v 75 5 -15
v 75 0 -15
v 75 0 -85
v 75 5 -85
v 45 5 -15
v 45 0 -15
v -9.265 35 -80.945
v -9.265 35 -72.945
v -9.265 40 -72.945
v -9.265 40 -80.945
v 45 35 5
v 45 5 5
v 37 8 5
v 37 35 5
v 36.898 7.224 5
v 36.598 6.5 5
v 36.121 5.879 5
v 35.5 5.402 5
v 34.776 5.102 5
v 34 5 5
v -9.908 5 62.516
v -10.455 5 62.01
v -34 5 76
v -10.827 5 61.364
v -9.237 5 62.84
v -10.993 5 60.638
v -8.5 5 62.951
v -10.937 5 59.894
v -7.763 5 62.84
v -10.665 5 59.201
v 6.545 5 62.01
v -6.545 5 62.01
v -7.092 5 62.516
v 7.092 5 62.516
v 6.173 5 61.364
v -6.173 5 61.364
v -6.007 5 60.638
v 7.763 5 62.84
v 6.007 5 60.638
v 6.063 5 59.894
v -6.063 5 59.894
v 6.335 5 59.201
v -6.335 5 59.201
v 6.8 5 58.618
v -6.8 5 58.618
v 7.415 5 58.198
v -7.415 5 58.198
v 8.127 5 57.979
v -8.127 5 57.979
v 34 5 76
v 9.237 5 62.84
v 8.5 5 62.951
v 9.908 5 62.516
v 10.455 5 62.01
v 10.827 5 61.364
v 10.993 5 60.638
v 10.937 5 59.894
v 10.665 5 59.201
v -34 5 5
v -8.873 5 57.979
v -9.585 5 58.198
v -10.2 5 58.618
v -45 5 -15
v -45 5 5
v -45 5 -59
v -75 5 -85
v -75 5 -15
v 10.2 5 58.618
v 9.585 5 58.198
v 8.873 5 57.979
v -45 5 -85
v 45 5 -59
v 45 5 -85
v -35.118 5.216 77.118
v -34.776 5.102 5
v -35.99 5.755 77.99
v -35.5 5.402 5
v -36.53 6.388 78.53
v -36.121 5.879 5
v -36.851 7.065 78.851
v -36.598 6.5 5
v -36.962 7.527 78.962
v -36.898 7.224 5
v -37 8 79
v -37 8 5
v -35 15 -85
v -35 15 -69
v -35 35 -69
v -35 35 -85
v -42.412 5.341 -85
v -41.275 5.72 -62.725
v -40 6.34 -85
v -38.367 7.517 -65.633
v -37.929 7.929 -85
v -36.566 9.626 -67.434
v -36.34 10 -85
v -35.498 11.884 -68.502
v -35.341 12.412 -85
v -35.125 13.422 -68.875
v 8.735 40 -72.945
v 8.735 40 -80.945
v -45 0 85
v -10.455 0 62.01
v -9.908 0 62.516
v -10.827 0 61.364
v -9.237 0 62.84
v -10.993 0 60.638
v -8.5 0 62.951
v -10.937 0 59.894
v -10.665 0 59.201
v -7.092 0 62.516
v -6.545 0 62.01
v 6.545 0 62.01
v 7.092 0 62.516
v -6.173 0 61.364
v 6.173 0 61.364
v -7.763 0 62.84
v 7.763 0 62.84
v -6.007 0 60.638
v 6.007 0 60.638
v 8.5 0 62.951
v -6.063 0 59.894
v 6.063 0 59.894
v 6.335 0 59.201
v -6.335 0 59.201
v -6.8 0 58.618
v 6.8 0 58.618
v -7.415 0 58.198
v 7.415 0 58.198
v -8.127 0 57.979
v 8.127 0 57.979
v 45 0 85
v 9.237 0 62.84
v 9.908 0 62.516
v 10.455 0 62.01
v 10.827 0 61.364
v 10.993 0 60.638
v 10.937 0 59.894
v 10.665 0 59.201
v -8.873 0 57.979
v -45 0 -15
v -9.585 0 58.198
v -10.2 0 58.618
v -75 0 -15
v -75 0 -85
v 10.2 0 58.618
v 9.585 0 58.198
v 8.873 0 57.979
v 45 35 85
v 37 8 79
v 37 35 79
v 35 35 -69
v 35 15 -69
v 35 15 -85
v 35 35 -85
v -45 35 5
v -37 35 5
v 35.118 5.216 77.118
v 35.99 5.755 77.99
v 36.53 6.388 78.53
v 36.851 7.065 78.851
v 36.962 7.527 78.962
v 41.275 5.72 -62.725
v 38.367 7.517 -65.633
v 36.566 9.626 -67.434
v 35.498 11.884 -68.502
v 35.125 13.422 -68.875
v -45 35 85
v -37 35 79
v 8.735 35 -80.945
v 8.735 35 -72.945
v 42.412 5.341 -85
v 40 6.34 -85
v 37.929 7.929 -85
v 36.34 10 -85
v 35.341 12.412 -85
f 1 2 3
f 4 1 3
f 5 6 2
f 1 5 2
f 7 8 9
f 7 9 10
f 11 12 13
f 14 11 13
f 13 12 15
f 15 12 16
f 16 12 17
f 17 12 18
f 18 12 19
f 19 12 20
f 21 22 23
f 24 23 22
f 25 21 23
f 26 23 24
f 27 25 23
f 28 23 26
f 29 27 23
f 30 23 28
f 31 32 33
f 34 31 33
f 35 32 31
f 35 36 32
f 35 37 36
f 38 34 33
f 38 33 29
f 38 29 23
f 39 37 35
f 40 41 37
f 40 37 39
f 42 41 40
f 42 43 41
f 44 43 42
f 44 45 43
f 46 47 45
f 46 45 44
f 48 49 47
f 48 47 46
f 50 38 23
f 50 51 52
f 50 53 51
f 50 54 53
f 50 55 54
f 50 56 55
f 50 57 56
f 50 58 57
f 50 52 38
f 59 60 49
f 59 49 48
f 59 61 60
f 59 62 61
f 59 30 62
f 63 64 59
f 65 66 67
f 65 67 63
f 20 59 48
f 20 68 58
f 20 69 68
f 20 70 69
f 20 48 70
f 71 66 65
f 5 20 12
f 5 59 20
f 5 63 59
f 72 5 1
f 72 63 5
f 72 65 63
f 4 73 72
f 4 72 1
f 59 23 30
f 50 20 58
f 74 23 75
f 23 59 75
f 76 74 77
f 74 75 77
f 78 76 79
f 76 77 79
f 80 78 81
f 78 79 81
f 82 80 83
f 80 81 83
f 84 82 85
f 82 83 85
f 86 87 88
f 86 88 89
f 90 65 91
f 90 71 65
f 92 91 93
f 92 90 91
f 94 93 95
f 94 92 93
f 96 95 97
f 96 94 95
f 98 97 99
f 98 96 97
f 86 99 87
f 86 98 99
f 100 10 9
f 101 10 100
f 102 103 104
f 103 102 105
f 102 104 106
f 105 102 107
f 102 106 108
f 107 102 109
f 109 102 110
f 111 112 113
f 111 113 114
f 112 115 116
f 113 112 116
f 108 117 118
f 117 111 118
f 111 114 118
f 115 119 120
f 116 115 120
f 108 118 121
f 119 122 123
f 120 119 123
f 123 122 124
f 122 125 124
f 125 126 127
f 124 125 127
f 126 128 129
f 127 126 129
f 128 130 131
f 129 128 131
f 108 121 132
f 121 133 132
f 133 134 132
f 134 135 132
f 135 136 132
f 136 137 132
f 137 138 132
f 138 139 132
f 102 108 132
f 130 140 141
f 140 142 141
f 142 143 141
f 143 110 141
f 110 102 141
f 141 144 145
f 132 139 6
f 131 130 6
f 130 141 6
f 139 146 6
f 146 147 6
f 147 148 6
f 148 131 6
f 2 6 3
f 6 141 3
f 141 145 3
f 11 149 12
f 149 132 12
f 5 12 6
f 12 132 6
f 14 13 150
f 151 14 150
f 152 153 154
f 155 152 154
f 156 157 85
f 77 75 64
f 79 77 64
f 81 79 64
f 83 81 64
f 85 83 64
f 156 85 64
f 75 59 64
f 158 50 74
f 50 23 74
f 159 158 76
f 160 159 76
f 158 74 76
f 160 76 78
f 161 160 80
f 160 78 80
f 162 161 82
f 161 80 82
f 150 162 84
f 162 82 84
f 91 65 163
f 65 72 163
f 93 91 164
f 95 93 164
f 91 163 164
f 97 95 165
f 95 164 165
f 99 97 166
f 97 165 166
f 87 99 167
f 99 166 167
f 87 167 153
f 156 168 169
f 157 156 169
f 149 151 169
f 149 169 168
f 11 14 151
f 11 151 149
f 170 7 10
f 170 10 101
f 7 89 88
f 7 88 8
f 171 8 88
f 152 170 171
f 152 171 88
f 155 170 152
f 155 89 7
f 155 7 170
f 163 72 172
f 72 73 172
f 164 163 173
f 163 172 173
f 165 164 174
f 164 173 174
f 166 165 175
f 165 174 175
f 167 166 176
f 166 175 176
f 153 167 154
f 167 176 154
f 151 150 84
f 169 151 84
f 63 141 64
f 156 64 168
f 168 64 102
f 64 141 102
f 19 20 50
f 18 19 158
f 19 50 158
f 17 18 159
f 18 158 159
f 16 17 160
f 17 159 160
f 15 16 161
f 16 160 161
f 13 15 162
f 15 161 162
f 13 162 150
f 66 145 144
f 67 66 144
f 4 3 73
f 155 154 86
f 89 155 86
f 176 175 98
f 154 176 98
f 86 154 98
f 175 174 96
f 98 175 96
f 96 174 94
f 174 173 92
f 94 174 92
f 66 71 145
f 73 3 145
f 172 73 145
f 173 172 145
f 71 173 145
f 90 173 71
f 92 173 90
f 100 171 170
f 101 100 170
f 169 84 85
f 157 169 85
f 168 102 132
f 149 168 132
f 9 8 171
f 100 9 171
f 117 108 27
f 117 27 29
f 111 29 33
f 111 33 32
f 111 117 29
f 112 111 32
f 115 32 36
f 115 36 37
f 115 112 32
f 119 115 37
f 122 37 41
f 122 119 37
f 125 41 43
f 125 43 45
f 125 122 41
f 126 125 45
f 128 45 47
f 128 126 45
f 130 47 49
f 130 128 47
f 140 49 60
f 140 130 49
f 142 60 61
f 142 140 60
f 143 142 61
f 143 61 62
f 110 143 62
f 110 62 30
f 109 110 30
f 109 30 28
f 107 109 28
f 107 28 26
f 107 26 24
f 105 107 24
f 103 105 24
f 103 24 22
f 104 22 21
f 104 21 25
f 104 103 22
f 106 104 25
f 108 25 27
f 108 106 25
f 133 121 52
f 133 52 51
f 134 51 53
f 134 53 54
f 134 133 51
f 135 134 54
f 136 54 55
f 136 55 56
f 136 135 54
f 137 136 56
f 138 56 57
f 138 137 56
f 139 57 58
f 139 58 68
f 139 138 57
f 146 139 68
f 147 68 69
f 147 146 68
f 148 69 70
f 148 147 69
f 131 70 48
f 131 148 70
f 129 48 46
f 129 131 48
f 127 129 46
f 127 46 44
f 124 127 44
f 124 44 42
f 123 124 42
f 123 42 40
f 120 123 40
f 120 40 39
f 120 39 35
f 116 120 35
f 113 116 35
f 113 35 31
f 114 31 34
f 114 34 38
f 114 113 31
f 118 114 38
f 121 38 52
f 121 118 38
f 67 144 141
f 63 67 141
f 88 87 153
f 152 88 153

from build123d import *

# Parameters (mm, degrees)
SKETCH1_R           = 2.5
BOSS_EXTRUDE1_DEPTH = 5
SKETCH2_W           = 70
SKETCH2_H           = 16
BOSS_EXTRUDE2_DEPTH = 30
FILLET1_R           = 10
FILLET2_R           = 3
SKETCH9_W           = 18
SKETCH9_H           = 8
BOSS_EXTRUDE9_DEPTH = 5


with BuildPart() as part:
    # Sketch1 → Boss-Extrude1 (new body)
    with BuildSketch(Plane(origin=(0, 0, 0), x_dir=(1, 0, 0), z_dir=(0, 1, 0))):
        Polygon((-45, -85), (45, -85), (45, 15), (75, 15), (75, 85), (-75, 85), (-75, 15), (-45, 15), align=None)
        with Locations((-8.5, -60.45079013)):
            Circle(SKETCH1_R, mode=Mode.SUBTRACT)
        with Locations((8.5, -60.45079013)):
            Circle(SKETCH1_R, mode=Mode.SUBTRACT)
    extrude(amount=BOSS_EXTRUDE1_DEPTH)

    # Sketch2 → Boss-Extrude2 (add)
    with BuildSketch(Plane(origin=(0, 5, 0), x_dir=(1, 0, 0), z_dir=(0, 1, 0))):
        with Locations((0, 77)):
            Rectangle(SKETCH2_W, SKETCH2_H)
        Polygon((-45, -85), (45, -85), (45, -5), (37, -5), (37, -79), (-37, -79), (-37, -5), (-45, -5), align=None)
    extrude(amount=BOSS_EXTRUDE2_DEPTH)

    # Fillet1
    fillet1_edges = [part.edges().sort_by_distance(p)[0] for p in [
        (0, 5, -69),
        (35, 5, -77),
        (-35, 5, -77),
    ]]
    fillet(fillet1_edges, radius=FILLET1_R)

    # Fillet2
    fillet2_edges = [part.edges().sort_by_distance(p)[0] for p in [
        (0, 5, 79),
        (-37, 5, 42),
        (37, 5, 42),
    ]]
    fillet(fillet2_edges, radius=FILLET2_R)

    # Sketch9 → Boss-Extrude9 (add)
    with BuildSketch(Plane(origin=(0, 35, 0), x_dir=(1, 0, 0), z_dir=(0, 1, 0))):
        with Locations((-0.264957407, 76.945272118)):
            Rectangle(SKETCH9_W, SKETCH9_H)
    extrude(amount=BOSS_EXTRUDE9_DEPTH)


solid = part.part
